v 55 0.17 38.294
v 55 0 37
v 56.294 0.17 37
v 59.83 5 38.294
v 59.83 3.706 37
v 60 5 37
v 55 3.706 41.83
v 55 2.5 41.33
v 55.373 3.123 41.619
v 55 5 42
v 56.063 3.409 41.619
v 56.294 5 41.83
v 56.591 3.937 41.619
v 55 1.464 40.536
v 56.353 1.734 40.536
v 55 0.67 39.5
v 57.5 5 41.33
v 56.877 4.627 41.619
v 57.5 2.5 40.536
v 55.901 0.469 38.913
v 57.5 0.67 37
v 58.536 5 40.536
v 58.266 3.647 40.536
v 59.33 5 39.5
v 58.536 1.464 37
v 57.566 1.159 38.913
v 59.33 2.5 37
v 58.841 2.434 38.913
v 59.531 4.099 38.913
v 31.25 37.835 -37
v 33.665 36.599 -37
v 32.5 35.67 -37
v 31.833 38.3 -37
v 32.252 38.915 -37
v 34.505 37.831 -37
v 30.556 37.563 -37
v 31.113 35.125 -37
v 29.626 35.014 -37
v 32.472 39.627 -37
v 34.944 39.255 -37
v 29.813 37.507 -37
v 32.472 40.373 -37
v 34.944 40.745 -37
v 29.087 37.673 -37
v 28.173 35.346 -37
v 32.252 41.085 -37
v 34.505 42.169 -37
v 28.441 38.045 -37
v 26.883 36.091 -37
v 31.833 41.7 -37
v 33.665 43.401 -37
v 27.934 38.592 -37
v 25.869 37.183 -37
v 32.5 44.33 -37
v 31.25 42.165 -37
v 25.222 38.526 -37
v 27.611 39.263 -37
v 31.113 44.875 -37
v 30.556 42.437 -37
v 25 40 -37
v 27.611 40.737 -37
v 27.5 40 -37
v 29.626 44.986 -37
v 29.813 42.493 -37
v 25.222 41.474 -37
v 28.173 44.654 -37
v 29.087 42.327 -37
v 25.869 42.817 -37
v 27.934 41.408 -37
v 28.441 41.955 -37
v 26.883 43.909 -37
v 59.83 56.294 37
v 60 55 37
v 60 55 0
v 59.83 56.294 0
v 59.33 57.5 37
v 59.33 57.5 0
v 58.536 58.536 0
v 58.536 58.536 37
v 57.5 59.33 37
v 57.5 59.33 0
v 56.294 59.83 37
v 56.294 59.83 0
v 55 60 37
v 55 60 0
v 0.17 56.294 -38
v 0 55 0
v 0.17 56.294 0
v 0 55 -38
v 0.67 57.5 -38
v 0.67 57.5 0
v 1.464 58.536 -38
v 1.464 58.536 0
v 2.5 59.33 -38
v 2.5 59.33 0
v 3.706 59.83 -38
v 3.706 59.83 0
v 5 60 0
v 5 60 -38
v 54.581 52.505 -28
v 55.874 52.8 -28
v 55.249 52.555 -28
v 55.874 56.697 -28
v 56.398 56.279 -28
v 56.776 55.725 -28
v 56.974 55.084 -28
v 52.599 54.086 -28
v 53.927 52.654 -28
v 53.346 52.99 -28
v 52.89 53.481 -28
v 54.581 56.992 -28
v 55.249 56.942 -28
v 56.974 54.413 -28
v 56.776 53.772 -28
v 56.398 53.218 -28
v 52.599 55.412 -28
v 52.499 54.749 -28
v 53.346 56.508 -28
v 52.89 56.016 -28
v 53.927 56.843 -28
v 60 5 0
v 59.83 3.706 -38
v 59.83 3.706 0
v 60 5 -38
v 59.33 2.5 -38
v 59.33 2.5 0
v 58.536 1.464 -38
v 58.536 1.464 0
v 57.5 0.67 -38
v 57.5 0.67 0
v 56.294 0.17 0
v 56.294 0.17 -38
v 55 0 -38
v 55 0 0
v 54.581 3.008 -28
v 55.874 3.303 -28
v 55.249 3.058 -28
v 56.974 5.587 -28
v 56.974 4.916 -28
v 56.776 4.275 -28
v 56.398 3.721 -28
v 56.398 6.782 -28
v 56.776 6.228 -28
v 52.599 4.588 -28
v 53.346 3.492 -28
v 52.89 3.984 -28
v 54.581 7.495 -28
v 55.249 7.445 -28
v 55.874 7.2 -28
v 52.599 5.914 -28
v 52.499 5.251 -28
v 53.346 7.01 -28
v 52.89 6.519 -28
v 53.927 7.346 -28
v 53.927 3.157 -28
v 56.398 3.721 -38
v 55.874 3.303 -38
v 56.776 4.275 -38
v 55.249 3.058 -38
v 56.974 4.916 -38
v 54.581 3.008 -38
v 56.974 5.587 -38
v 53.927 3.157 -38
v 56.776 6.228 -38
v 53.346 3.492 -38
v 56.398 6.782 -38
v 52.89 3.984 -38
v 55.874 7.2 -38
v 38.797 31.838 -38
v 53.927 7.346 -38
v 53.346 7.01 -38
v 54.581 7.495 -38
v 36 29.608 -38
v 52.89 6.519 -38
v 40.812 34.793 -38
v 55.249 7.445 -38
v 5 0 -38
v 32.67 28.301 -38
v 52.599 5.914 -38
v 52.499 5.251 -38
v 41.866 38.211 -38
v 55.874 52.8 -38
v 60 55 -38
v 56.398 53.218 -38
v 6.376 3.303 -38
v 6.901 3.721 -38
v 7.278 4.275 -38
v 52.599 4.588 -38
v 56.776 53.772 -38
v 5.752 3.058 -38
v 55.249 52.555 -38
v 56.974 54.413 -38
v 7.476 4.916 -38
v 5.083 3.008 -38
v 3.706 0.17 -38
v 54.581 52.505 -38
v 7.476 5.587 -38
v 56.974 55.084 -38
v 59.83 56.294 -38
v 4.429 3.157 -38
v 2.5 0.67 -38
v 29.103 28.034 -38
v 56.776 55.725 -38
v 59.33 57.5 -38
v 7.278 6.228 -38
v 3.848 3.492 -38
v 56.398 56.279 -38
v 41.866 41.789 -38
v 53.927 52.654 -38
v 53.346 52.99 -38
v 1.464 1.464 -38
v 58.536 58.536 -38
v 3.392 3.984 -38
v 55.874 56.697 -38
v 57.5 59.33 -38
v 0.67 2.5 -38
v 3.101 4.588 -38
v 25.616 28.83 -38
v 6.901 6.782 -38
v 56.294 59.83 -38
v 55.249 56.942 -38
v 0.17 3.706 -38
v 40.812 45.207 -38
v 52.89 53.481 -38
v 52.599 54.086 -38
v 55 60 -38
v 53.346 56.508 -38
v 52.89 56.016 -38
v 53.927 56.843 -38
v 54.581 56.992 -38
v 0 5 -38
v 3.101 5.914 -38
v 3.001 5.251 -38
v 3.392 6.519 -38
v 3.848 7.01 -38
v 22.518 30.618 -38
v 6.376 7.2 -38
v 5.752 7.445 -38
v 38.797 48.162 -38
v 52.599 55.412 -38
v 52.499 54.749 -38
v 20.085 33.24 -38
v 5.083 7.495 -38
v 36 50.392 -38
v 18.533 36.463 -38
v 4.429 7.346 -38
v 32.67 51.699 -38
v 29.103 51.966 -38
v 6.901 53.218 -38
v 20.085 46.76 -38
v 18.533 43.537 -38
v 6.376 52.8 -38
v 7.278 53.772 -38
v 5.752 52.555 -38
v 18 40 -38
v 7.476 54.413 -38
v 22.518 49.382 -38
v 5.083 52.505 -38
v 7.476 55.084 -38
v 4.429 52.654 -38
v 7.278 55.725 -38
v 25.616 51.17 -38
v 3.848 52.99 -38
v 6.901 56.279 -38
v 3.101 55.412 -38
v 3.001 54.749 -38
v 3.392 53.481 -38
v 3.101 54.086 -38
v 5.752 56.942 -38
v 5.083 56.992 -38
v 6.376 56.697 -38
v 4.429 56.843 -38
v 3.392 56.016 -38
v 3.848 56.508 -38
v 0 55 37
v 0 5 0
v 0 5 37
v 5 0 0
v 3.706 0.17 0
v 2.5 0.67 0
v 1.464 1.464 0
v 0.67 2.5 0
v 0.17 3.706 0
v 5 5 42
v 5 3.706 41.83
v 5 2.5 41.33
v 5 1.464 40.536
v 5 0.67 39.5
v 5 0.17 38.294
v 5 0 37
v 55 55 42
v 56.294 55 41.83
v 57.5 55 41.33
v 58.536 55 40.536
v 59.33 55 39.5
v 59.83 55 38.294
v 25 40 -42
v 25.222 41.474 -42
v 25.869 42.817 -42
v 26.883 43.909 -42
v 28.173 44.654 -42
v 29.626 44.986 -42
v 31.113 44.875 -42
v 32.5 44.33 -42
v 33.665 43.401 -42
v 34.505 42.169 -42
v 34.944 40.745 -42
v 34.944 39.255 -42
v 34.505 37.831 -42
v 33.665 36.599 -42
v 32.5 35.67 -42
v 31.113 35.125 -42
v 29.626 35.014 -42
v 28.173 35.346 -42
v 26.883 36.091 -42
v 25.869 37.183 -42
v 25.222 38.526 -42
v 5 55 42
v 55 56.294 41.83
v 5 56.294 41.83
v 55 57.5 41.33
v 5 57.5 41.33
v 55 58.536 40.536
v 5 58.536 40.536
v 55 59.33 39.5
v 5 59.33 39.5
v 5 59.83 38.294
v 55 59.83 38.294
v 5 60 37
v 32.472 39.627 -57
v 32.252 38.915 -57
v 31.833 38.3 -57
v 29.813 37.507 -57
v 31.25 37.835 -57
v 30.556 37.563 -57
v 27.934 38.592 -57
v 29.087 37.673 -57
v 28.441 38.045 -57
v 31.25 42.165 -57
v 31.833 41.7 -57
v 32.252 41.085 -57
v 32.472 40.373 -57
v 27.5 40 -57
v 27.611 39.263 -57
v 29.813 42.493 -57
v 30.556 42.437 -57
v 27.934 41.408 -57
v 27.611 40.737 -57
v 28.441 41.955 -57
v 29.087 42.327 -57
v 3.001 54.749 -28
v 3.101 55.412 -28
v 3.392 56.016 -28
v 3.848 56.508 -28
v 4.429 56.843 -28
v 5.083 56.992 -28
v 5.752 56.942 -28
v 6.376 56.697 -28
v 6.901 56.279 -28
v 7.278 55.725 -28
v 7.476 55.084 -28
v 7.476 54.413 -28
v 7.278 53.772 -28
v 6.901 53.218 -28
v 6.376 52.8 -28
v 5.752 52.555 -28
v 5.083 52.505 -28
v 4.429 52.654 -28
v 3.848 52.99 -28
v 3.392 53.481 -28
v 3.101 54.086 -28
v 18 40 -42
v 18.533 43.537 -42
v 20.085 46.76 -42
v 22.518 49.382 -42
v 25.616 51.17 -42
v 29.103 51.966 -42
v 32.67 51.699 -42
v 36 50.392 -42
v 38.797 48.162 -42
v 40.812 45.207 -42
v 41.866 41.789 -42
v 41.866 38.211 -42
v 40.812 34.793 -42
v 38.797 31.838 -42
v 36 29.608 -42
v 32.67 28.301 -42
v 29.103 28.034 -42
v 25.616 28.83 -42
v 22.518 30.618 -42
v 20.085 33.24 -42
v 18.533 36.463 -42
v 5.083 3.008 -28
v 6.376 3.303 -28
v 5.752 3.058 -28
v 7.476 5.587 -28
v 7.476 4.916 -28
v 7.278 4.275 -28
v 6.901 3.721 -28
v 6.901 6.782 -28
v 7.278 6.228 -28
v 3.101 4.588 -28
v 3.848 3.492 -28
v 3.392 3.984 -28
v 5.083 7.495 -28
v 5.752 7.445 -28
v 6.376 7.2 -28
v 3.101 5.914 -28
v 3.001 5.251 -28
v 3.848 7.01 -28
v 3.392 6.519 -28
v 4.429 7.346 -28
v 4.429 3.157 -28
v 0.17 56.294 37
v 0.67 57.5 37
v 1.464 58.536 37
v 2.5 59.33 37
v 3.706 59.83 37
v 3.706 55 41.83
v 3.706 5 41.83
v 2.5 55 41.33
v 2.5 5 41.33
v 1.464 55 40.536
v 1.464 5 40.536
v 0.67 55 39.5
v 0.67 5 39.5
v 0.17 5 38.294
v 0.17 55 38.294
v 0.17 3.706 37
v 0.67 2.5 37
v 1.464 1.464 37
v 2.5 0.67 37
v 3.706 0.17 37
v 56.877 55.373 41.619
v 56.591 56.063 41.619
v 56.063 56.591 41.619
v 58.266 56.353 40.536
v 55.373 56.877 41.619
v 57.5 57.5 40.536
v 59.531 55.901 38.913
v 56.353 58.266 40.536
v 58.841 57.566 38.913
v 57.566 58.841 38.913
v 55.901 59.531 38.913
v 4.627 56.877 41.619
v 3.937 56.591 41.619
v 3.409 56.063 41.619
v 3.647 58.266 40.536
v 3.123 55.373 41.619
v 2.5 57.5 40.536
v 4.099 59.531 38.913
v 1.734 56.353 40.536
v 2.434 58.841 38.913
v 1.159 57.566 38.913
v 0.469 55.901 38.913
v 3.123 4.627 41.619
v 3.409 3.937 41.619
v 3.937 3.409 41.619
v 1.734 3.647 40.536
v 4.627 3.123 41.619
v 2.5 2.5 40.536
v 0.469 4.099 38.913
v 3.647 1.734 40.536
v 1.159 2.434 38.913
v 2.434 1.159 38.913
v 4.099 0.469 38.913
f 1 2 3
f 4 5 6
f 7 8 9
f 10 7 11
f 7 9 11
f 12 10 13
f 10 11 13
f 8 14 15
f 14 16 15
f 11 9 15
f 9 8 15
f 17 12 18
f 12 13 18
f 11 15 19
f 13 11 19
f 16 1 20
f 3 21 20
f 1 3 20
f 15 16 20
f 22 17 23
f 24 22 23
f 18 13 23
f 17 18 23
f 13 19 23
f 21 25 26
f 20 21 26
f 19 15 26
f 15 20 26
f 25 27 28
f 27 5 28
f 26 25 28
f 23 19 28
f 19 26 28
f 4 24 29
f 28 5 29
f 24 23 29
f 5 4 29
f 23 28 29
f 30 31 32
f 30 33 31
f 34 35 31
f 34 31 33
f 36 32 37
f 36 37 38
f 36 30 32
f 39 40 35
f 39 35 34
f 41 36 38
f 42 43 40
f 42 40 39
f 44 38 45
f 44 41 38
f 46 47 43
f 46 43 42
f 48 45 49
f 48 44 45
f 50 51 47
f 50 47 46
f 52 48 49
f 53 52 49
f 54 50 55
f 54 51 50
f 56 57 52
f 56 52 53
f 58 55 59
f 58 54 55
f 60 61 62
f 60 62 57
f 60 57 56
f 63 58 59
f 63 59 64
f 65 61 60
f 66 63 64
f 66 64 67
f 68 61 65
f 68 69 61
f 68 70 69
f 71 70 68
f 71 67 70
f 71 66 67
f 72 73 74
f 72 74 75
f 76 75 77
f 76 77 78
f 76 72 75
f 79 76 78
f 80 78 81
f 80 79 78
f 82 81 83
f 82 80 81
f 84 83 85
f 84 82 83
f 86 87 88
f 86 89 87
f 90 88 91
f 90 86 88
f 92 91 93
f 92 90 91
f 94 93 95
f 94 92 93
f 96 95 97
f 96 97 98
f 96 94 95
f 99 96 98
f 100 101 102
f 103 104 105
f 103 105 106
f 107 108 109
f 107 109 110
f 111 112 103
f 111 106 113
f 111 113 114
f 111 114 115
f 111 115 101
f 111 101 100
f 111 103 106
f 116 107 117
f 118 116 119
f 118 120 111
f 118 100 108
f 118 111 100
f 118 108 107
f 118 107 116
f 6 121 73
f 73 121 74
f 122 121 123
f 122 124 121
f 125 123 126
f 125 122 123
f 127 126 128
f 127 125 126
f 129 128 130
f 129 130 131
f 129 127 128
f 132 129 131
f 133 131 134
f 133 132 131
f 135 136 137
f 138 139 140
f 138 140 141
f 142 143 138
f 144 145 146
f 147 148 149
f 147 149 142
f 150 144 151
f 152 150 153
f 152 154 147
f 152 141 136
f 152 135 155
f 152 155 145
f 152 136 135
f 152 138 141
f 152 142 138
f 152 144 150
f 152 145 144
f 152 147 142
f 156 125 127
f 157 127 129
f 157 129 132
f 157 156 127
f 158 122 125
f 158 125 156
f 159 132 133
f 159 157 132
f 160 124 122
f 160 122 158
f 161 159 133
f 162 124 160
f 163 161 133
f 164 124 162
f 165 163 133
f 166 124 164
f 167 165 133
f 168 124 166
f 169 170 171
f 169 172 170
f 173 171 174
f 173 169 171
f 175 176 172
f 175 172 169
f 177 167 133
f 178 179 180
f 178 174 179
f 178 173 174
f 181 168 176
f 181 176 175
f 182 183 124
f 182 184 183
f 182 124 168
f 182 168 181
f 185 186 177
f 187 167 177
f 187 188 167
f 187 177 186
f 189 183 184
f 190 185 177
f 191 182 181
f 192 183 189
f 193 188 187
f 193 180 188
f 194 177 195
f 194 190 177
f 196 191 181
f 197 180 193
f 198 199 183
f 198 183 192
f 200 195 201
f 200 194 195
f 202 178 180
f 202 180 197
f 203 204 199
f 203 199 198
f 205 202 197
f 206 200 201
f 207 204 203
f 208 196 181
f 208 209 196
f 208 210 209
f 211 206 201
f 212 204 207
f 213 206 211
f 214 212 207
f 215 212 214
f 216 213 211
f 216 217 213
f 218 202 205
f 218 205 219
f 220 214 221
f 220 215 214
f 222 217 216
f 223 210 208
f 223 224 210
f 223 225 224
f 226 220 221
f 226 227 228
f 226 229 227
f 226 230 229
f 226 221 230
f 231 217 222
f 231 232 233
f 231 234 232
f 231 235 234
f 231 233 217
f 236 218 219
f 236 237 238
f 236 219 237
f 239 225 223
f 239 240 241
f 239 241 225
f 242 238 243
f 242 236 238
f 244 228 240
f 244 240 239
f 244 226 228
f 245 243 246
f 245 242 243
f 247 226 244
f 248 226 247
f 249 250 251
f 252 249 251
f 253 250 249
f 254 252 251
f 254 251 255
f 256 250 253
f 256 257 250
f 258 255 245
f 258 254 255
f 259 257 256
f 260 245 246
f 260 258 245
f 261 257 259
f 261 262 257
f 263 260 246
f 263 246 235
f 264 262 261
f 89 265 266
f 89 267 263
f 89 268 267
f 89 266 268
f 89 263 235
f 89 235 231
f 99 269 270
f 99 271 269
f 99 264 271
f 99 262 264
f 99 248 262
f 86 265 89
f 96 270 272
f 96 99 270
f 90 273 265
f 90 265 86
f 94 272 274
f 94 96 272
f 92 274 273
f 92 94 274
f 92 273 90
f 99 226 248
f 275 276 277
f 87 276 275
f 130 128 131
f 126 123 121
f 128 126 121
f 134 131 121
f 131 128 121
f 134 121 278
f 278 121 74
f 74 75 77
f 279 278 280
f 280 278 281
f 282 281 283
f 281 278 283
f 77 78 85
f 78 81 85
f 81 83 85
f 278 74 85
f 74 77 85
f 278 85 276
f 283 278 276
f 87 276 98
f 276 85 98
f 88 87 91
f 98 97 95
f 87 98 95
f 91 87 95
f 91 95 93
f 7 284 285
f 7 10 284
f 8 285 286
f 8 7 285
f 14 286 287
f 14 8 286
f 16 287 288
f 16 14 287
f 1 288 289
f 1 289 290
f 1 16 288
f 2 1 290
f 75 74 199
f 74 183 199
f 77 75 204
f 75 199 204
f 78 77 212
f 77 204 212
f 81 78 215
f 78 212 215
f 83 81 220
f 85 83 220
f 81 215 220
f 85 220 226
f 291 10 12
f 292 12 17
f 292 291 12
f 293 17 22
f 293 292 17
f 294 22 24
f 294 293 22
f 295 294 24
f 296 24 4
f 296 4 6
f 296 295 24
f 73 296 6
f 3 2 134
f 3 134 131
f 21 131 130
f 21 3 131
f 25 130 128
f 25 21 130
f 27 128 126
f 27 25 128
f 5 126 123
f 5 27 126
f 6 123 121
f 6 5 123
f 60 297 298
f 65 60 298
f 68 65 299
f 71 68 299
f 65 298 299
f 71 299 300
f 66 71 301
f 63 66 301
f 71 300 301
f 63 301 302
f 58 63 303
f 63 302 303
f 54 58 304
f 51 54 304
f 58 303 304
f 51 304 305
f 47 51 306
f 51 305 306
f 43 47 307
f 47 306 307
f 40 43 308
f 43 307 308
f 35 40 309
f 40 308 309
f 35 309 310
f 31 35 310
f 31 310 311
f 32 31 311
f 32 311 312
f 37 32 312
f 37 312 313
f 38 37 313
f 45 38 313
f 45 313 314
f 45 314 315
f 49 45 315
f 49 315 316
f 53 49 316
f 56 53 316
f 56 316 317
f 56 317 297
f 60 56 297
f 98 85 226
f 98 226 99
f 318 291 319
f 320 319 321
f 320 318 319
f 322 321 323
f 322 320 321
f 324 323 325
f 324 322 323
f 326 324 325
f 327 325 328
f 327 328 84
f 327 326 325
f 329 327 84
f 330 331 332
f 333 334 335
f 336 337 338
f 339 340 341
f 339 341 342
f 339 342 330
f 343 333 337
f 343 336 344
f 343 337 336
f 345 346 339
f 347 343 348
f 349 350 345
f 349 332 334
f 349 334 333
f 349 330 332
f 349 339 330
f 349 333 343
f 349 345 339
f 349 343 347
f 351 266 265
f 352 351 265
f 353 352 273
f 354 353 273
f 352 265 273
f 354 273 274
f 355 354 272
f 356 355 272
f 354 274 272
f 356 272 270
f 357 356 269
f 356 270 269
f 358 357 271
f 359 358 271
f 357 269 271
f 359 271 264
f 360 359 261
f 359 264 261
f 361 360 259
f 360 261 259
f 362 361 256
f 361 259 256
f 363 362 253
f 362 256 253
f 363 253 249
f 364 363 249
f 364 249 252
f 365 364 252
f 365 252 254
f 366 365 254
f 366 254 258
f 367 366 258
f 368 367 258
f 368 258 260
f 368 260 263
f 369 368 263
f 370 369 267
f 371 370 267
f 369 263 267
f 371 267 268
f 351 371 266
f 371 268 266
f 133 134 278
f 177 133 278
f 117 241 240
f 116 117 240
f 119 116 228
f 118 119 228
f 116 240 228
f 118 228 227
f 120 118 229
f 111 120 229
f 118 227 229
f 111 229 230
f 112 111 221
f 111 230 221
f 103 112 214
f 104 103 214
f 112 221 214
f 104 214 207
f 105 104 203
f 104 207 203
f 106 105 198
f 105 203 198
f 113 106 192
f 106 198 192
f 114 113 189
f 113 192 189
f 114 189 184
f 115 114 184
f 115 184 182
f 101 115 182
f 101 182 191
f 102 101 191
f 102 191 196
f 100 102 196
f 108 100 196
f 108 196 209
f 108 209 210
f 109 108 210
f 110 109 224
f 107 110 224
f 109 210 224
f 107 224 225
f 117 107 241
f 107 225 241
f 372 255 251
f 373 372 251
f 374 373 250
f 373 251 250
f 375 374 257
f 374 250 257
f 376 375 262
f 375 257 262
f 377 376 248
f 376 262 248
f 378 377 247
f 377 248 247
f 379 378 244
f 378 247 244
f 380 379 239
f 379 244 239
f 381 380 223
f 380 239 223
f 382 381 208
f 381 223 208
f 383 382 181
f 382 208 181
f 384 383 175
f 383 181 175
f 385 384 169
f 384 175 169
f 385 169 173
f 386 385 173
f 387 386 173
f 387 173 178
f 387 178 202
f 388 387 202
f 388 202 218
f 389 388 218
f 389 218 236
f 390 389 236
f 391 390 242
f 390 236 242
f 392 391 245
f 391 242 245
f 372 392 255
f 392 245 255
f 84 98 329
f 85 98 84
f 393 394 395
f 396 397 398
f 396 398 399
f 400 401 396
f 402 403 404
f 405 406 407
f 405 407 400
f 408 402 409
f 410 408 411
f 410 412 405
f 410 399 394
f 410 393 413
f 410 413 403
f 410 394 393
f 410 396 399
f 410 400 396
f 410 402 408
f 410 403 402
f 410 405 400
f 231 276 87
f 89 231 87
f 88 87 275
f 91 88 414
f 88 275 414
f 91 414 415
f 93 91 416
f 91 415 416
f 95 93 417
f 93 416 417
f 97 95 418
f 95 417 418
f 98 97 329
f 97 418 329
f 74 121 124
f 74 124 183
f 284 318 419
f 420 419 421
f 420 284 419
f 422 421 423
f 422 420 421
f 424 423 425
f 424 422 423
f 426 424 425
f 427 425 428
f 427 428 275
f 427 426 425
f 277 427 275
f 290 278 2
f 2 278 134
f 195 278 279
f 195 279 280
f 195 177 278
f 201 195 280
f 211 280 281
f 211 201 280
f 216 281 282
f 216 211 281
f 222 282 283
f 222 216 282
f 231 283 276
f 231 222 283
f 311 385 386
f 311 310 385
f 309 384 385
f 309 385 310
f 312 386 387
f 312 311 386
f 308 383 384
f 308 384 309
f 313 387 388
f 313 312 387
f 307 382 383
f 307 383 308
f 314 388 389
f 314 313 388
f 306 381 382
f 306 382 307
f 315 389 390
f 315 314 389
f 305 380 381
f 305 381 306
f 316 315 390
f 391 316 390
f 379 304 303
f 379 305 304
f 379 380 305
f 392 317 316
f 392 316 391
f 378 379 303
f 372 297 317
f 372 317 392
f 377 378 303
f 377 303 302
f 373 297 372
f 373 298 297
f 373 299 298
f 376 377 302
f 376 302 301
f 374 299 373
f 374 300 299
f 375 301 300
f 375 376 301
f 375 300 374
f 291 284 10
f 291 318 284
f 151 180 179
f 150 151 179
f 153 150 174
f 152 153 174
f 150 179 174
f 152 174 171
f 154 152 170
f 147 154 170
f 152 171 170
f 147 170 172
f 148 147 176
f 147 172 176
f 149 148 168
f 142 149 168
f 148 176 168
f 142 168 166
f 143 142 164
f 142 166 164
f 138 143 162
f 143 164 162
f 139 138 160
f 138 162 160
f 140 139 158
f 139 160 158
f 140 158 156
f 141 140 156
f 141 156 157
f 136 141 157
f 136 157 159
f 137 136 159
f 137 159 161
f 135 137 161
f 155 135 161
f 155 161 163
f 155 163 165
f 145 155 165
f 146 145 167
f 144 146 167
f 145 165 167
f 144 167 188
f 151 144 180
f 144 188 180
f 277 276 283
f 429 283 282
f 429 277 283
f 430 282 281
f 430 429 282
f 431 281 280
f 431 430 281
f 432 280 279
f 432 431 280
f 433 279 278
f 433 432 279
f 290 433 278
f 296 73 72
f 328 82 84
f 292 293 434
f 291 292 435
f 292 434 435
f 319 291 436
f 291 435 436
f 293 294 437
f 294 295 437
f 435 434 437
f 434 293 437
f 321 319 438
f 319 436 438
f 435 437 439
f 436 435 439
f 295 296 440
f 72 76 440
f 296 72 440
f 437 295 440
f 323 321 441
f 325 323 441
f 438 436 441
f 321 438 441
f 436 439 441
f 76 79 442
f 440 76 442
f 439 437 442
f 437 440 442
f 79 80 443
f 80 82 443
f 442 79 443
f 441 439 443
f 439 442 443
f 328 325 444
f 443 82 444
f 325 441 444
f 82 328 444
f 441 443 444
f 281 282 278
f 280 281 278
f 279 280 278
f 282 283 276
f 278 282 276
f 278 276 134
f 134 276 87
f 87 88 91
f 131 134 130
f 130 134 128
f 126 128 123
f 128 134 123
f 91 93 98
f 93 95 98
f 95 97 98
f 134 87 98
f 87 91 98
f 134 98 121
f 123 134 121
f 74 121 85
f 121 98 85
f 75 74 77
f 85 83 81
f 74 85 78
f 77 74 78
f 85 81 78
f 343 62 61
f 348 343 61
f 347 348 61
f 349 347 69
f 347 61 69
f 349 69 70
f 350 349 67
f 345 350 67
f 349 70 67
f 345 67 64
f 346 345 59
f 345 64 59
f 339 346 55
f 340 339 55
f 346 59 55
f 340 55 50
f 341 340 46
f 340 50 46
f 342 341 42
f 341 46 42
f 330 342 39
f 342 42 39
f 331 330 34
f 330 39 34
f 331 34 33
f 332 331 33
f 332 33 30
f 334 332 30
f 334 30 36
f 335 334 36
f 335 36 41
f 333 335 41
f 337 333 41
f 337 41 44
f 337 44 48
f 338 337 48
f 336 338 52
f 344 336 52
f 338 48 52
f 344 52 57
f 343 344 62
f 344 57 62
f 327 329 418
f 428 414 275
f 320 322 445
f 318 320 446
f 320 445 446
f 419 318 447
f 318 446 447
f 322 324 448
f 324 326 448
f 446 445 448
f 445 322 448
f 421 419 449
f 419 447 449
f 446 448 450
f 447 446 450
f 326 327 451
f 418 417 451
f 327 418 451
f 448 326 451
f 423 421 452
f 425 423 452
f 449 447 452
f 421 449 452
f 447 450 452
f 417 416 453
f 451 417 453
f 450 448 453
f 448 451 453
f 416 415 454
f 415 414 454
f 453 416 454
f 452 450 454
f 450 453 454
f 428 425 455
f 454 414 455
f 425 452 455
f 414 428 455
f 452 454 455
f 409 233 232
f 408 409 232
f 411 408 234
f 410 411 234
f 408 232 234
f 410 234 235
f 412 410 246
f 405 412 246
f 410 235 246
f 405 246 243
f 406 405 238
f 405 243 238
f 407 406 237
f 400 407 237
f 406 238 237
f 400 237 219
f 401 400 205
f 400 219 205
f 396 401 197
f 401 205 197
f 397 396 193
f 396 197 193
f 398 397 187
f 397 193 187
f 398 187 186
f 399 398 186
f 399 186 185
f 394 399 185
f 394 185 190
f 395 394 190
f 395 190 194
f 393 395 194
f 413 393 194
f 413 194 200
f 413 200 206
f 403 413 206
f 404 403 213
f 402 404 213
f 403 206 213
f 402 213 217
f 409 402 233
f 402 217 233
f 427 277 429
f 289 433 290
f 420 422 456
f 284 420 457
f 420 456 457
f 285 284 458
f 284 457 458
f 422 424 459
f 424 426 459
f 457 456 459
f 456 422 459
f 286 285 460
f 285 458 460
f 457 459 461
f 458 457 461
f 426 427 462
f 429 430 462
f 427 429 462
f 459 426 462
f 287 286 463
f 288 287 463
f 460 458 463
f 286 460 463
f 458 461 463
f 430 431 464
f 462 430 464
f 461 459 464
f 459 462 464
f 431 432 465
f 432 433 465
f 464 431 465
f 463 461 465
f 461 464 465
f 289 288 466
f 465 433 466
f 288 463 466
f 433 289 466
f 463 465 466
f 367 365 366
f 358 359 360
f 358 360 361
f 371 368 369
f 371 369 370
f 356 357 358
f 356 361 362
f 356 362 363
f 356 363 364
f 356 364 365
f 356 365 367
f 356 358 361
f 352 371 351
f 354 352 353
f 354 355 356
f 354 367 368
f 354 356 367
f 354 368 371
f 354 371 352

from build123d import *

# Parameters (mm, degrees)
SKETCH2_W           = 60
SKETCH2_H           = 60
BOSS_EXTRUDE1_DEPTH = 42
SKETCH3_W           = 60
SKETCH3_H           = 60
BOSS_EXTRUDE2_DEPTH = 38
FILLET1_R           = 5
FILLET2_R           = 5
FILLET3_R           = 5
SKETCH4_R           = 2.25
CUT_EXTRUDE1_DEPTH  = 10
SKETCH5_R           = 12
BOSS_EXTRUDE3_DEPTH = 4
SKETCH6_R           = 5
BOSS_EXTRUDE4_DEPTH = 28
CUT_EXTRUDE2_DEPTH  = 28
SKETCH8_R           = 5
CUT_EXTRUDE3_DEPTH  = 33
SKETCH9_R           = 2.5
BOSS_EXTRUDE5_DEPTH = 20


with BuildPart() as part:
    # Sketch2 → Boss-Extrude1 (new body)
    with BuildSketch(Plane.XY):
        with Locations((30, 30)):
            Rectangle(SKETCH2_W, SKETCH2_H)
    extrude(amount=BOSS_EXTRUDE1_DEPTH)

    # Fillet1
    fillet1_edges = [part.edges().sort_by_distance(p)[0] for p in [
        (0, 60, 21),
        (60, 60, 21),
        (60, 0, 21),
        (0, 0, 21),
    ]]
    fillet(fillet1_edges, radius=FILLET1_R)

    # Fillet3
    fillet3_edges = [part.edges().sort_by_distance(p)[0] for p in [
        (30, 0, 42),
        (0, 30, 42),
        (60, 30, 42),
        (30, 60, 42),
        (58.535533906, 58.535533906, 42),
        (1.464466094, 58.535533906, 42),
        (58.535533906, 1.464466094, 42),
        (1.464466094, 1.464466094, 42),
    ]]
    fillet(fillet3_edges, radius=FILLET3_R)


with BuildPart() as body_2:
    # Sketch3 → Boss-Extrude2 (new body)
    with BuildSketch(Plane(origin=(0, 0, 0), x_dir=(-1, 0, 0), z_dir=(0, 0, -1))):
        with Locations((-30, 30)):
            Rectangle(SKETCH3_W, SKETCH3_H)
    extrude(amount=BOSS_EXTRUDE2_DEPTH)

    # Fillet2
    fillet2_edges = [body_2.edges().sort_by_distance(p)[0] for p in [
        (60, 0, -19),
        (60, 60, -19),
        (0, 60, -19),
        (0, 0, -19),
    ]]
    fillet(fillet2_edges, radius=FILLET2_R)

    # Sketch4 → Cut-Extrude1 (cut)
    with BuildSketch(Plane(origin=(0, 0, -38), x_dir=(-1, 0, 0), z_dir=(0, 0, -1))):
        with Locations((-5.251262658, 54.748737342)):
            Circle(SKETCH4_R)
        with Locations((-54.748737342, 54.748737342)):
            Circle(SKETCH4_R)
        with Locations((-54.748737342, 5.251262658)):
            Circle(SKETCH4_R)
        with Locations((-5.251262658, 5.251262658)):
            Circle(SKETCH4_R)
    extrude(amount=-CUT_EXTRUDE1_DEPTH, mode=Mode.SUBTRACT)

    # Sketch5 → Boss-Extrude3 (add)
    with BuildSketch(Plane(origin=(0, 0, -38), x_dir=(-1, 0, 0), z_dir=(0, 0, -1))):
        with Locations((-30, 40)):
            Circle(SKETCH5_R)
    extrude(amount=BOSS_EXTRUDE3_DEPTH)

    # Sketch6 → Boss-Extrude4 (add)
    with BuildSketch(Plane(origin=(0, 0, -42), x_dir=(-1, 0, 0), z_dir=(0, 0, -1))):
        with Locations((-30, 40)):
            Circle(SKETCH6_R)
    extrude(amount=BOSS_EXTRUDE4_DEPTH)

    # Sketch7 → Cut-Extrude2 (cut)
    with BuildSketch(Plane(origin=(0, 42.5, 0), x_dir=(1, 0, 0), z_dir=(0, 1, 0))):
        with BuildLine():
            Line((28, 47), (28, 70))
            Line((28, 70), (32, 70))
            Line((32, 70), (32, 47))
            ThreePointArc((32, 47), (30, 45), (28, 47))
        make_face()
    extrude(amount=CUT_EXTRUDE2_DEPTH, mode=Mode.SUBTRACT)

    # Sketch8 → Cut-Extrude3 (cut)
    with BuildSketch(Plane(origin=(0, 0, -70), x_dir=(-1, 0, 0), z_dir=(0, 0, -1))):
        with Locations((-30, 40)):
            Circle(SKETCH8_R)
    extrude(amount=-CUT_EXTRUDE3_DEPTH, mode=Mode.SUBTRACT)

    # Sketch9 → Boss-Extrude5 (add)
    with BuildSketch(Plane(origin=(0, 0, -37), x_dir=(-1, 0, 0), z_dir=(0, 0, -1))):
        with Locations((-30, 40)):
            Circle(SKETCH9_R)
    extrude(amount=BOSS_EXTRUDE5_DEPTH)


solid = Compound([part.part, body_2.part])
